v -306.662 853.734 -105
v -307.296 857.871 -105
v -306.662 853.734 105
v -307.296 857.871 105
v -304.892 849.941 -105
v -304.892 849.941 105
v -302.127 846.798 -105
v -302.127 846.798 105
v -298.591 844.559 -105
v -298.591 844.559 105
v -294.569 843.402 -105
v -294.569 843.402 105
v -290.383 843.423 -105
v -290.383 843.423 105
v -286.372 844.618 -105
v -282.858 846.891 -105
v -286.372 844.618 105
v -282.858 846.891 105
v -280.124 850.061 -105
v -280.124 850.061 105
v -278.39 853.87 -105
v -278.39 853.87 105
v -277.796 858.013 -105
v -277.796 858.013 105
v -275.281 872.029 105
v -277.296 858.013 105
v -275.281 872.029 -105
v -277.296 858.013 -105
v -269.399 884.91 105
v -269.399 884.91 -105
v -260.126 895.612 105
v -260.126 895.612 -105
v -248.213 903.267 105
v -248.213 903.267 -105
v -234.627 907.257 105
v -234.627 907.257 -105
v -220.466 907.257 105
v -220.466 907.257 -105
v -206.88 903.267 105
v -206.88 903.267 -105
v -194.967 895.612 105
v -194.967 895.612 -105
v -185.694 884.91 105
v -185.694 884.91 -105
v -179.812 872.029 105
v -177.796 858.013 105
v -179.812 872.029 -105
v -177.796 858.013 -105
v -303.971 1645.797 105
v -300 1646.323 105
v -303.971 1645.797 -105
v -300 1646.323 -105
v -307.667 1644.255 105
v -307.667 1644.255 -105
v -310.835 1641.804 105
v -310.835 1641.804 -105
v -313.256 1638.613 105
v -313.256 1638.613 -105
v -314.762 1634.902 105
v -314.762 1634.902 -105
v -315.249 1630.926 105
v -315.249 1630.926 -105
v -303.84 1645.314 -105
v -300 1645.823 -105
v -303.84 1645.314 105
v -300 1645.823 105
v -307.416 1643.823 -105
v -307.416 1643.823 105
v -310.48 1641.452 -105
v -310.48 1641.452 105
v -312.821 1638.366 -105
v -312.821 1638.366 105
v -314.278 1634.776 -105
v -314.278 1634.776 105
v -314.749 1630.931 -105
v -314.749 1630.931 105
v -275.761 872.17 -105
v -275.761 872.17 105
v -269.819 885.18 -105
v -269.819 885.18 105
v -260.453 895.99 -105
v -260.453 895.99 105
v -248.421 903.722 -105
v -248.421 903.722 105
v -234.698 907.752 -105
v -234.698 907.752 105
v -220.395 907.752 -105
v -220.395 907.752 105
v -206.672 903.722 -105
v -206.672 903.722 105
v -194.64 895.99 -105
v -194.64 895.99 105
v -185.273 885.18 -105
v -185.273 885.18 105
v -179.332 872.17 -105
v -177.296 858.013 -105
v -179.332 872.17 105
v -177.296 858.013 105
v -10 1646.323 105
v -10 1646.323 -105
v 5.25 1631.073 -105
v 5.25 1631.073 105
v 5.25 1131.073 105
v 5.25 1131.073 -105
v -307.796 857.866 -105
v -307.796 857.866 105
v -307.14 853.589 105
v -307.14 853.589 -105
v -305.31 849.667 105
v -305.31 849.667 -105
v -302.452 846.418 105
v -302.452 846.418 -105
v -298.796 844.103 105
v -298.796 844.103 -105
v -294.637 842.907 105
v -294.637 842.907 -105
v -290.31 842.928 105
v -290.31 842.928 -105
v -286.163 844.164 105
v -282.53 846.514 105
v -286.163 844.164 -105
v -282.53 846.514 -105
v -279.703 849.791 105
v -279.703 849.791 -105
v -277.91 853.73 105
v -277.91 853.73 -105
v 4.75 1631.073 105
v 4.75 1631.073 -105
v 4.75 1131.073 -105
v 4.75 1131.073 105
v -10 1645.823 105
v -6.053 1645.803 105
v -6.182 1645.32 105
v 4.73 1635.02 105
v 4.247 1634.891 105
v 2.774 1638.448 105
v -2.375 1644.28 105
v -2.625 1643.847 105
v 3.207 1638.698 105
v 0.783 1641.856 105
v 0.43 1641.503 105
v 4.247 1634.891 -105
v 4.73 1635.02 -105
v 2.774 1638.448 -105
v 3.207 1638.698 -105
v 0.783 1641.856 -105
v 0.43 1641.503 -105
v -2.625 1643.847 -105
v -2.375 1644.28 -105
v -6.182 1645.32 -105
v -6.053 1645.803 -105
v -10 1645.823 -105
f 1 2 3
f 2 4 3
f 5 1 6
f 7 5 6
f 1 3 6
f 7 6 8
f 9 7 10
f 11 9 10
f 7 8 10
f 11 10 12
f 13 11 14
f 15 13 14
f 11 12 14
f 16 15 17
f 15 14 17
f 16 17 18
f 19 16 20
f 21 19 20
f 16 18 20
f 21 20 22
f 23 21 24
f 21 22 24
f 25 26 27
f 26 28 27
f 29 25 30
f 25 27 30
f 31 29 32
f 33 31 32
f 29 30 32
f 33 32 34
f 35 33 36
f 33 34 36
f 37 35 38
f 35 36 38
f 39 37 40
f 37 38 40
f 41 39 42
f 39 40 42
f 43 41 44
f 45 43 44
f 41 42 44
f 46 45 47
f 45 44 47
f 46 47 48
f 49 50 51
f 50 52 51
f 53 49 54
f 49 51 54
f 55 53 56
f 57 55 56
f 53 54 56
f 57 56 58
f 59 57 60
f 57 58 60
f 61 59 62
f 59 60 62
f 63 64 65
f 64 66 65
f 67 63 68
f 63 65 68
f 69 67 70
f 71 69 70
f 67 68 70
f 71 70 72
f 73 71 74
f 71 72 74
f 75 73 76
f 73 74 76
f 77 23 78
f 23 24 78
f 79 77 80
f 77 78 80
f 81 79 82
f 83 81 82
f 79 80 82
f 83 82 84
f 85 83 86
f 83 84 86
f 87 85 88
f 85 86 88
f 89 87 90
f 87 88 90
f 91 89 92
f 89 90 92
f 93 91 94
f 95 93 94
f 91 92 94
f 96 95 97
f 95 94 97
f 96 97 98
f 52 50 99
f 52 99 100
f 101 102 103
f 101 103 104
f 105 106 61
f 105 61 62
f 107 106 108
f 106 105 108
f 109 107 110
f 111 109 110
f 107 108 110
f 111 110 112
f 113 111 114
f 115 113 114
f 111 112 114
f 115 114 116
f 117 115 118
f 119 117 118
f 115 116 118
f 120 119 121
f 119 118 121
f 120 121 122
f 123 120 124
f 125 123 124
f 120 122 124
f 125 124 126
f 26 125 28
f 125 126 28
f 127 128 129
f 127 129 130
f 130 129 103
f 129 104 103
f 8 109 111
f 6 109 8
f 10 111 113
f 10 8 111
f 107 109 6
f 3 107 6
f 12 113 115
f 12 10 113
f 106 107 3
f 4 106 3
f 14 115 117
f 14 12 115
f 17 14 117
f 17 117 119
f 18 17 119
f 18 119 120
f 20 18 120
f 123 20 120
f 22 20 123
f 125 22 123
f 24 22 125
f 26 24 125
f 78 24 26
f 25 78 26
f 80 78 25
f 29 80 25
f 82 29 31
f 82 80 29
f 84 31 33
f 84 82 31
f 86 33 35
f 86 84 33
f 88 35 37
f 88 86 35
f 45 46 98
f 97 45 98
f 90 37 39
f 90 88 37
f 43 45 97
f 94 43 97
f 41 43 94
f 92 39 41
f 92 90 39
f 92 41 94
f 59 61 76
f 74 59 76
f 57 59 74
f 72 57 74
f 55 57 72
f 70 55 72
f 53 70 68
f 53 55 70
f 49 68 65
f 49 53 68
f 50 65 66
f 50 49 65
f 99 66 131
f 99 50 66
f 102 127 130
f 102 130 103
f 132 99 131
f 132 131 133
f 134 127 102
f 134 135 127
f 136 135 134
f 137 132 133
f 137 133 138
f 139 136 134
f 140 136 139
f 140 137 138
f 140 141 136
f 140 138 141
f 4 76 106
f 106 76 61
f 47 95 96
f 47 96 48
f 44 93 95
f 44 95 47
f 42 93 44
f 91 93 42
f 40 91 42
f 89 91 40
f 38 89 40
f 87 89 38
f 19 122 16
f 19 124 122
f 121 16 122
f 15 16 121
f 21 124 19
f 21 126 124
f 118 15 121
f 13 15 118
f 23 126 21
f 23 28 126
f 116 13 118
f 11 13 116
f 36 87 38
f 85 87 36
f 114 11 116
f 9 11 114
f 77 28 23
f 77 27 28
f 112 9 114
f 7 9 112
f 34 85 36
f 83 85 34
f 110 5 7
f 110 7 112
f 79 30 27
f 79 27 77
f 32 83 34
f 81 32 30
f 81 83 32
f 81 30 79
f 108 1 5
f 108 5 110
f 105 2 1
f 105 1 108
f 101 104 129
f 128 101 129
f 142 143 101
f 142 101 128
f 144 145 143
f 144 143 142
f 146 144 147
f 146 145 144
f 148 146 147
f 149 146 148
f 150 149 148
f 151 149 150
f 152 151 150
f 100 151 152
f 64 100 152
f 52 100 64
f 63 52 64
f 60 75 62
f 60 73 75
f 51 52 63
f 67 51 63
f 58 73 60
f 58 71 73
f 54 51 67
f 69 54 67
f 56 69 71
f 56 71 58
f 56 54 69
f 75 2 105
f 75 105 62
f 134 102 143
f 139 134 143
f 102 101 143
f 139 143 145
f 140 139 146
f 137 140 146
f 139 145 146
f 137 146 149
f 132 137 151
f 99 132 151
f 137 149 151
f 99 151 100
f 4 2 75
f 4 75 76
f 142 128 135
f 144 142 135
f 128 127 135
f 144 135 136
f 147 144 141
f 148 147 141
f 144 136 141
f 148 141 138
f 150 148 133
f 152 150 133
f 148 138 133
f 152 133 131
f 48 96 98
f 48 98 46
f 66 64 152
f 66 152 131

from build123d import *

# Parameters (mm, degrees)
SKETCH2_W = 0.5
SKETCH2_H = 210


with BuildPart() as part:
    # Sweep1: sweep along a path in Sketch1
    with BuildLine(Plane.XY) as sweep1_path:
        Line((5, 1131.07306524), (5, 1631.07306524))
        ThreePointArc((5, 1631.07306524), (0.606601718, 1641.679666958), (-10, 1646.07306524))
        Line((-10, 1646.07306524), (-300, 1646.07306524))
        ThreePointArc((-300, 1646.07306524), (-310.657609176, 1641.628413015), (-314.99930284, 1630.928447459))
        Line((-314.99930284, 1630.928447459), (-307.545742915, 857.868578543))
        ThreePointArc((-307.545742915, 857.868578543), (-292.474130344, 843.013370614), (-277.546440075, 858.013196323))
        ThreePointArc((-277.546440075, 858.013196323), (-227.546440075, 908.013196323), (-177.546440075, 858.013196323))
    # Sketch2 → Sweep1 (sweep)
    with BuildSketch(Plane(origin=(0, 1131.07306524, 0), x_dir=(1, 0, 0), z_dir=(0, 1, 0))):
        with Locations((5, 0)):
            Rectangle(SKETCH2_W, SKETCH2_H)
    sweep(path=sweep1_path.line)


solid = part.part
